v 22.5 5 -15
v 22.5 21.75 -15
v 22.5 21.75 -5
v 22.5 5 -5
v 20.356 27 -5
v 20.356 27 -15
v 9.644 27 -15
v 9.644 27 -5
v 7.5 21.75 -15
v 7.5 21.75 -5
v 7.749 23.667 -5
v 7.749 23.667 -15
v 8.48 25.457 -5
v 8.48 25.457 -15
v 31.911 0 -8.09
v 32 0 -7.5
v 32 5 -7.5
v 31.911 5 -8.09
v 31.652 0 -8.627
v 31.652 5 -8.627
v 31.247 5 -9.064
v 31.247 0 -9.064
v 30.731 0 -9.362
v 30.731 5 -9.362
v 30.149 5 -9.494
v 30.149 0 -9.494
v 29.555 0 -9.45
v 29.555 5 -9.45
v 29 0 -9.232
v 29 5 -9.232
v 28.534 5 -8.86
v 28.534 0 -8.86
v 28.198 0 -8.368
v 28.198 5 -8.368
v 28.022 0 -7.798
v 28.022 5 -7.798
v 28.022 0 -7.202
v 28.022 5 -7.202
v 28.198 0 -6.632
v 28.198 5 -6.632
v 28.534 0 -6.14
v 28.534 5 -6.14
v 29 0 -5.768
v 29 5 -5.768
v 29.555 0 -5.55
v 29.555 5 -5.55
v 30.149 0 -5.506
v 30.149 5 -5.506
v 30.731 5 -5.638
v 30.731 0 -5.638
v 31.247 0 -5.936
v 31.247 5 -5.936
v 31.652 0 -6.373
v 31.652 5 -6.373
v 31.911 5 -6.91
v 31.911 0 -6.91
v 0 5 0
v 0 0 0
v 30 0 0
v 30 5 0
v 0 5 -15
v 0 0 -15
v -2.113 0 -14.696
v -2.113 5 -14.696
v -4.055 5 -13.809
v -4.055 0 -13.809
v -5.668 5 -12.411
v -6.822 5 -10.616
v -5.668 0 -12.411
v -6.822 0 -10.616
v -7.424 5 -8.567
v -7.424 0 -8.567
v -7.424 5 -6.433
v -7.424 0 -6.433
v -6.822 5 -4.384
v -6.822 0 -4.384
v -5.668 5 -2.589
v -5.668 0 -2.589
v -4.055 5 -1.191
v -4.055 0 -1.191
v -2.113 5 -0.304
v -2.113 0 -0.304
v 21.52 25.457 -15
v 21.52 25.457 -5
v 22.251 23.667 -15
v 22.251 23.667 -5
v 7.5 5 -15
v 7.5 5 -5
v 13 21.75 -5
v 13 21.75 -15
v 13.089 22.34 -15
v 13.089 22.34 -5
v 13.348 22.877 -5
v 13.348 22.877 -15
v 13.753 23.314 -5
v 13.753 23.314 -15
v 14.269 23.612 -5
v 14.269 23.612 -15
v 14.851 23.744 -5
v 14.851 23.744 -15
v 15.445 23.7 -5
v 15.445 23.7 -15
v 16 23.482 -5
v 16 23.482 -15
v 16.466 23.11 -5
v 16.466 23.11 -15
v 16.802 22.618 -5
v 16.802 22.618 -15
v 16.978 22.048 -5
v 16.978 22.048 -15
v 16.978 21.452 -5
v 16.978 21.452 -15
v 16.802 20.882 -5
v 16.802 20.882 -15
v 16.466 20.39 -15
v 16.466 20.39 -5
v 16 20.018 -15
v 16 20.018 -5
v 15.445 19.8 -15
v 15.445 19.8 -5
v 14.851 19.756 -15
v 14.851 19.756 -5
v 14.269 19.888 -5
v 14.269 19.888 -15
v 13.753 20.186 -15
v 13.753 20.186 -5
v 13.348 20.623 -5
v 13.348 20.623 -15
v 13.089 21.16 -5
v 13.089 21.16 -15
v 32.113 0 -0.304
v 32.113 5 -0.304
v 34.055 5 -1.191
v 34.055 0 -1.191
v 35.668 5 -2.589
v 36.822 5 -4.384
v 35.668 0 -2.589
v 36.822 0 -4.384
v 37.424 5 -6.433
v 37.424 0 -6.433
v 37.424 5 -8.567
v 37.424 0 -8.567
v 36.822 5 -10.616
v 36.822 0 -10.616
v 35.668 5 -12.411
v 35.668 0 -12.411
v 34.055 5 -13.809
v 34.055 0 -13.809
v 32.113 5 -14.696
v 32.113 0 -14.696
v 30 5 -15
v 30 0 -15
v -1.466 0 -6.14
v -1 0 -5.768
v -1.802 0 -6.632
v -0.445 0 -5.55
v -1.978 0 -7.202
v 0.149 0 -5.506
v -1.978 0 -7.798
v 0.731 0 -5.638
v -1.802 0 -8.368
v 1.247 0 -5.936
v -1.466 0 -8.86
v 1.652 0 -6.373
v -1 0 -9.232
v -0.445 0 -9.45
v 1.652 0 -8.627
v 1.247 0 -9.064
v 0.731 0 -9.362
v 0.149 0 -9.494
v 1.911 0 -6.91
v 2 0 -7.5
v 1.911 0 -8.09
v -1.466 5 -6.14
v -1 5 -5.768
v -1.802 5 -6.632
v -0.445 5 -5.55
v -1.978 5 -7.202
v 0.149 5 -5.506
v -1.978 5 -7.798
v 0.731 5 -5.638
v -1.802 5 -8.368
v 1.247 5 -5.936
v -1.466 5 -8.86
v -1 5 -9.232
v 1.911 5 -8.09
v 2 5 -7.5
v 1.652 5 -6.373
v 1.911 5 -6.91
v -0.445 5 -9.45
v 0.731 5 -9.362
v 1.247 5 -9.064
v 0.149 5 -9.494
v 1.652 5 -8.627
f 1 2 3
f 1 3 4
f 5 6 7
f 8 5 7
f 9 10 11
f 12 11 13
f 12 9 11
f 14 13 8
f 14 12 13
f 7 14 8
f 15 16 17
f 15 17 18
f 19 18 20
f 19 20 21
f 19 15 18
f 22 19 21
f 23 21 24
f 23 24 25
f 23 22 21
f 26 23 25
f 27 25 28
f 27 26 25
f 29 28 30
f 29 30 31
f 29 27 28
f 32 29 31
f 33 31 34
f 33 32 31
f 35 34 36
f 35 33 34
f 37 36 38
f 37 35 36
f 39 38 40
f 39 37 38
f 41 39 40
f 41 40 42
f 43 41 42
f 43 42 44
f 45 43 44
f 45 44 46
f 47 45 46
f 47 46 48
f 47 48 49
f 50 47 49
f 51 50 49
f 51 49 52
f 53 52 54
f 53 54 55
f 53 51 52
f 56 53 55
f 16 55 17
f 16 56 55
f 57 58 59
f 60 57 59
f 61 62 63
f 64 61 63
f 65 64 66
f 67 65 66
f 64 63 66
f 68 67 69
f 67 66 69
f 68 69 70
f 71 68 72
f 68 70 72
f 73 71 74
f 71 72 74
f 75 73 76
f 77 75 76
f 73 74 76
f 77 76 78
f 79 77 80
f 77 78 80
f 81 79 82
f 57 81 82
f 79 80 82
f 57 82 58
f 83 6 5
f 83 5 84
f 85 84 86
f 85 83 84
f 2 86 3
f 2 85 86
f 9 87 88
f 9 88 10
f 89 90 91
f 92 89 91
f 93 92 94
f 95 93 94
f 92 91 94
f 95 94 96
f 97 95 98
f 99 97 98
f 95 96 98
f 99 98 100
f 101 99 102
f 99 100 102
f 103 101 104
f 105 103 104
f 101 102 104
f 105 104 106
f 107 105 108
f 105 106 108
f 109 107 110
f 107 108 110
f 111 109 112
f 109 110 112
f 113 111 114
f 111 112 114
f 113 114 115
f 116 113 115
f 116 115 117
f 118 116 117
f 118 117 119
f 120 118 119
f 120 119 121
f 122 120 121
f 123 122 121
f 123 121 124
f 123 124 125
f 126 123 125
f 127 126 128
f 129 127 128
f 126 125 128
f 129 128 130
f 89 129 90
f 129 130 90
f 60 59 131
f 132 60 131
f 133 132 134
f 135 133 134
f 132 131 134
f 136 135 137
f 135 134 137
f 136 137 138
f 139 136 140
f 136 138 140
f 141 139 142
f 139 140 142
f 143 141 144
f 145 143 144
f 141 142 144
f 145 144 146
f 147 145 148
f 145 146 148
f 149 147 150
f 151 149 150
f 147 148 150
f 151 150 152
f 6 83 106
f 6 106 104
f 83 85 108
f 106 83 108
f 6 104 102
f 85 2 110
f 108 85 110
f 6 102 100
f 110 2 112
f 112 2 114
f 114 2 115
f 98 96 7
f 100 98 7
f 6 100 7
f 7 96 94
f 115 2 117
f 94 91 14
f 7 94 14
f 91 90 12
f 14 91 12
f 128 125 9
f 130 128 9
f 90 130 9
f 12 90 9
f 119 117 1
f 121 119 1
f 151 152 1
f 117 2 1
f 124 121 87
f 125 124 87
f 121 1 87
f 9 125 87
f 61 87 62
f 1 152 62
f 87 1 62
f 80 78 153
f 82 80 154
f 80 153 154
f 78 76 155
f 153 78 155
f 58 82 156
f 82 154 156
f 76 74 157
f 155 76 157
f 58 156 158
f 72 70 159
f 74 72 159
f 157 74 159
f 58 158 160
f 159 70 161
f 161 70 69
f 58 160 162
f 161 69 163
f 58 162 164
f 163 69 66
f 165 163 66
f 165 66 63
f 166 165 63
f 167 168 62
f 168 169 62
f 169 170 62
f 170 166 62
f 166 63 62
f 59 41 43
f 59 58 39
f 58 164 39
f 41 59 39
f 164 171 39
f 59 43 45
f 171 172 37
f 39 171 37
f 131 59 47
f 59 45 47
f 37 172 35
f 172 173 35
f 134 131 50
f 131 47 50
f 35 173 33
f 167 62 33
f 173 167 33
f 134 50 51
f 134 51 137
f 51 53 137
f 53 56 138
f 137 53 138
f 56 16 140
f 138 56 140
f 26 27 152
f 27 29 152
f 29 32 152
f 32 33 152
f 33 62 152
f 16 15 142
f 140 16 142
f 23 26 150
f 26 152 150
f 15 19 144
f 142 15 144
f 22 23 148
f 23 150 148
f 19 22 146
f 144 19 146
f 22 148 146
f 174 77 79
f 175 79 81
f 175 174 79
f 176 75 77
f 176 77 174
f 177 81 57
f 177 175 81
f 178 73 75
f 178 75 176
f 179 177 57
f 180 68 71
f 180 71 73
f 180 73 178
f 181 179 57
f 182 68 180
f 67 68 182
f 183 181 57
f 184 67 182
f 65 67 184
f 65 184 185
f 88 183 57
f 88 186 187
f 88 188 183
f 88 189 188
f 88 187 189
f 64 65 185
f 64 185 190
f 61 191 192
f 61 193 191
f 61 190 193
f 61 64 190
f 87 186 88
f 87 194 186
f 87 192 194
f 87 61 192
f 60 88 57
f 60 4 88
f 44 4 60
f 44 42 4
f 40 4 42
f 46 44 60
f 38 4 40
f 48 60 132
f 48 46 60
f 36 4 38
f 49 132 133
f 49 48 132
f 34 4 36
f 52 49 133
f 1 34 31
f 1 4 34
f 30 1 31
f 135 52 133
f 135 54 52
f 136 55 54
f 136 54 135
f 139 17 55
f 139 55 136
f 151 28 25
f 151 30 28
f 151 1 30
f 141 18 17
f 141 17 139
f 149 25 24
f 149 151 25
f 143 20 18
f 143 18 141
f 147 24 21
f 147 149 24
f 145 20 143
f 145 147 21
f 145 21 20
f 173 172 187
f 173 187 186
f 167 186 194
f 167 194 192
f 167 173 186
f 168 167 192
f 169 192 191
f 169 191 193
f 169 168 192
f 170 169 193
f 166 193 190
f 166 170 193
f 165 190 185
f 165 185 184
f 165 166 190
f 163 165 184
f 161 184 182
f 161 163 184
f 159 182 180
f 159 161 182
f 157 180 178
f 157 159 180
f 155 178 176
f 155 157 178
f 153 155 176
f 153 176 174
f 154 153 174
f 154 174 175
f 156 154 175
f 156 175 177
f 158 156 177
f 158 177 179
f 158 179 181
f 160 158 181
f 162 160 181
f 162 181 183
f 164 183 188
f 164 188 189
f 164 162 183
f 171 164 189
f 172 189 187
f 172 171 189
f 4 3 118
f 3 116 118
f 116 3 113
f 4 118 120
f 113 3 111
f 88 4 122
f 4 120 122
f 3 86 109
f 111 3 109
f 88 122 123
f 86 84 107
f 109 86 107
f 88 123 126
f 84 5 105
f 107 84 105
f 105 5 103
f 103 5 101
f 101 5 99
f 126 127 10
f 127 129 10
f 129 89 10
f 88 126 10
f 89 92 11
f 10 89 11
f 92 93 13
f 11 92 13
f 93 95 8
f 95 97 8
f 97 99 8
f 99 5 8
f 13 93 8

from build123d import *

# Parameters (mm, degrees)
SKETCH1_R           = 2
BOSS_EXTRUDE1_DEPTH = 5
SKETCH3_R           = 2
BOSS_EXTRUDE2_DEPTH = 10
SKETCH4_W           = 24.111622735
SKETCH4_H           = 4.195341451
CUT_EXTRUDE1_DEPTH  = 16


with BuildPart() as part:
    # Sketch1 → Boss-Extrude1 (new body)
    with BuildSketch(Plane(origin=(0, 0, 0), x_dir=(1, 0, 0), z_dir=(0, 1, 0))):
        with BuildLine():
            Line((0, 0), (30, 0))
            ThreePointArc((30, 0), (37.5, 7.5), (30, 15))
            Line((30, 15), (0, 15))
            ThreePointArc((0, 15), (-7.5, 7.5), (0, 0))
        make_face()
        with Locations((0, 7.5)):
            Circle(SKETCH1_R, mode=Mode.SUBTRACT)
        with Locations((30, 7.5)):
            Circle(SKETCH1_R, mode=Mode.SUBTRACT)
    extrude(amount=BOSS_EXTRUDE1_DEPTH)

    # Sketch3 → Boss-Extrude2 (add)
    with BuildSketch(Plane(origin=(0, 0, -15), x_dir=(-1, 0, 0), z_dir=(0, 0, -1))):
        with BuildLine():
            Line((-22.5, 5), (-7.5, 5))
            Line((-7.5, 5), (-7.5, 21.75))
            ThreePointArc((-7.5, 21.75), (-15, 29.25), (-22.5, 21.75))
            Line((-22.5, 21.75), (-22.5, 5))
        make_face()
        with Locations((-15, 21.75)):
            Circle(SKETCH3_R, mode=Mode.SUBTRACT)
    extrude(amount=-BOSS_EXTRUDE2_DEPTH)

    # Sketch4 → Cut-Extrude1 (cut, through all)
    with BuildSketch(Plane(origin=(0, 0, -15), x_dir=(-1, 0, 0), z_dir=(0, 0, -1))):
        with Locations((-13.441214338, 29.097670726)):
            Rectangle(SKETCH4_W, SKETCH4_H)
    extrude(amount=-CUT_EXTRUDE1_DEPTH, mode=Mode.SUBTRACT)


solid = part.part
